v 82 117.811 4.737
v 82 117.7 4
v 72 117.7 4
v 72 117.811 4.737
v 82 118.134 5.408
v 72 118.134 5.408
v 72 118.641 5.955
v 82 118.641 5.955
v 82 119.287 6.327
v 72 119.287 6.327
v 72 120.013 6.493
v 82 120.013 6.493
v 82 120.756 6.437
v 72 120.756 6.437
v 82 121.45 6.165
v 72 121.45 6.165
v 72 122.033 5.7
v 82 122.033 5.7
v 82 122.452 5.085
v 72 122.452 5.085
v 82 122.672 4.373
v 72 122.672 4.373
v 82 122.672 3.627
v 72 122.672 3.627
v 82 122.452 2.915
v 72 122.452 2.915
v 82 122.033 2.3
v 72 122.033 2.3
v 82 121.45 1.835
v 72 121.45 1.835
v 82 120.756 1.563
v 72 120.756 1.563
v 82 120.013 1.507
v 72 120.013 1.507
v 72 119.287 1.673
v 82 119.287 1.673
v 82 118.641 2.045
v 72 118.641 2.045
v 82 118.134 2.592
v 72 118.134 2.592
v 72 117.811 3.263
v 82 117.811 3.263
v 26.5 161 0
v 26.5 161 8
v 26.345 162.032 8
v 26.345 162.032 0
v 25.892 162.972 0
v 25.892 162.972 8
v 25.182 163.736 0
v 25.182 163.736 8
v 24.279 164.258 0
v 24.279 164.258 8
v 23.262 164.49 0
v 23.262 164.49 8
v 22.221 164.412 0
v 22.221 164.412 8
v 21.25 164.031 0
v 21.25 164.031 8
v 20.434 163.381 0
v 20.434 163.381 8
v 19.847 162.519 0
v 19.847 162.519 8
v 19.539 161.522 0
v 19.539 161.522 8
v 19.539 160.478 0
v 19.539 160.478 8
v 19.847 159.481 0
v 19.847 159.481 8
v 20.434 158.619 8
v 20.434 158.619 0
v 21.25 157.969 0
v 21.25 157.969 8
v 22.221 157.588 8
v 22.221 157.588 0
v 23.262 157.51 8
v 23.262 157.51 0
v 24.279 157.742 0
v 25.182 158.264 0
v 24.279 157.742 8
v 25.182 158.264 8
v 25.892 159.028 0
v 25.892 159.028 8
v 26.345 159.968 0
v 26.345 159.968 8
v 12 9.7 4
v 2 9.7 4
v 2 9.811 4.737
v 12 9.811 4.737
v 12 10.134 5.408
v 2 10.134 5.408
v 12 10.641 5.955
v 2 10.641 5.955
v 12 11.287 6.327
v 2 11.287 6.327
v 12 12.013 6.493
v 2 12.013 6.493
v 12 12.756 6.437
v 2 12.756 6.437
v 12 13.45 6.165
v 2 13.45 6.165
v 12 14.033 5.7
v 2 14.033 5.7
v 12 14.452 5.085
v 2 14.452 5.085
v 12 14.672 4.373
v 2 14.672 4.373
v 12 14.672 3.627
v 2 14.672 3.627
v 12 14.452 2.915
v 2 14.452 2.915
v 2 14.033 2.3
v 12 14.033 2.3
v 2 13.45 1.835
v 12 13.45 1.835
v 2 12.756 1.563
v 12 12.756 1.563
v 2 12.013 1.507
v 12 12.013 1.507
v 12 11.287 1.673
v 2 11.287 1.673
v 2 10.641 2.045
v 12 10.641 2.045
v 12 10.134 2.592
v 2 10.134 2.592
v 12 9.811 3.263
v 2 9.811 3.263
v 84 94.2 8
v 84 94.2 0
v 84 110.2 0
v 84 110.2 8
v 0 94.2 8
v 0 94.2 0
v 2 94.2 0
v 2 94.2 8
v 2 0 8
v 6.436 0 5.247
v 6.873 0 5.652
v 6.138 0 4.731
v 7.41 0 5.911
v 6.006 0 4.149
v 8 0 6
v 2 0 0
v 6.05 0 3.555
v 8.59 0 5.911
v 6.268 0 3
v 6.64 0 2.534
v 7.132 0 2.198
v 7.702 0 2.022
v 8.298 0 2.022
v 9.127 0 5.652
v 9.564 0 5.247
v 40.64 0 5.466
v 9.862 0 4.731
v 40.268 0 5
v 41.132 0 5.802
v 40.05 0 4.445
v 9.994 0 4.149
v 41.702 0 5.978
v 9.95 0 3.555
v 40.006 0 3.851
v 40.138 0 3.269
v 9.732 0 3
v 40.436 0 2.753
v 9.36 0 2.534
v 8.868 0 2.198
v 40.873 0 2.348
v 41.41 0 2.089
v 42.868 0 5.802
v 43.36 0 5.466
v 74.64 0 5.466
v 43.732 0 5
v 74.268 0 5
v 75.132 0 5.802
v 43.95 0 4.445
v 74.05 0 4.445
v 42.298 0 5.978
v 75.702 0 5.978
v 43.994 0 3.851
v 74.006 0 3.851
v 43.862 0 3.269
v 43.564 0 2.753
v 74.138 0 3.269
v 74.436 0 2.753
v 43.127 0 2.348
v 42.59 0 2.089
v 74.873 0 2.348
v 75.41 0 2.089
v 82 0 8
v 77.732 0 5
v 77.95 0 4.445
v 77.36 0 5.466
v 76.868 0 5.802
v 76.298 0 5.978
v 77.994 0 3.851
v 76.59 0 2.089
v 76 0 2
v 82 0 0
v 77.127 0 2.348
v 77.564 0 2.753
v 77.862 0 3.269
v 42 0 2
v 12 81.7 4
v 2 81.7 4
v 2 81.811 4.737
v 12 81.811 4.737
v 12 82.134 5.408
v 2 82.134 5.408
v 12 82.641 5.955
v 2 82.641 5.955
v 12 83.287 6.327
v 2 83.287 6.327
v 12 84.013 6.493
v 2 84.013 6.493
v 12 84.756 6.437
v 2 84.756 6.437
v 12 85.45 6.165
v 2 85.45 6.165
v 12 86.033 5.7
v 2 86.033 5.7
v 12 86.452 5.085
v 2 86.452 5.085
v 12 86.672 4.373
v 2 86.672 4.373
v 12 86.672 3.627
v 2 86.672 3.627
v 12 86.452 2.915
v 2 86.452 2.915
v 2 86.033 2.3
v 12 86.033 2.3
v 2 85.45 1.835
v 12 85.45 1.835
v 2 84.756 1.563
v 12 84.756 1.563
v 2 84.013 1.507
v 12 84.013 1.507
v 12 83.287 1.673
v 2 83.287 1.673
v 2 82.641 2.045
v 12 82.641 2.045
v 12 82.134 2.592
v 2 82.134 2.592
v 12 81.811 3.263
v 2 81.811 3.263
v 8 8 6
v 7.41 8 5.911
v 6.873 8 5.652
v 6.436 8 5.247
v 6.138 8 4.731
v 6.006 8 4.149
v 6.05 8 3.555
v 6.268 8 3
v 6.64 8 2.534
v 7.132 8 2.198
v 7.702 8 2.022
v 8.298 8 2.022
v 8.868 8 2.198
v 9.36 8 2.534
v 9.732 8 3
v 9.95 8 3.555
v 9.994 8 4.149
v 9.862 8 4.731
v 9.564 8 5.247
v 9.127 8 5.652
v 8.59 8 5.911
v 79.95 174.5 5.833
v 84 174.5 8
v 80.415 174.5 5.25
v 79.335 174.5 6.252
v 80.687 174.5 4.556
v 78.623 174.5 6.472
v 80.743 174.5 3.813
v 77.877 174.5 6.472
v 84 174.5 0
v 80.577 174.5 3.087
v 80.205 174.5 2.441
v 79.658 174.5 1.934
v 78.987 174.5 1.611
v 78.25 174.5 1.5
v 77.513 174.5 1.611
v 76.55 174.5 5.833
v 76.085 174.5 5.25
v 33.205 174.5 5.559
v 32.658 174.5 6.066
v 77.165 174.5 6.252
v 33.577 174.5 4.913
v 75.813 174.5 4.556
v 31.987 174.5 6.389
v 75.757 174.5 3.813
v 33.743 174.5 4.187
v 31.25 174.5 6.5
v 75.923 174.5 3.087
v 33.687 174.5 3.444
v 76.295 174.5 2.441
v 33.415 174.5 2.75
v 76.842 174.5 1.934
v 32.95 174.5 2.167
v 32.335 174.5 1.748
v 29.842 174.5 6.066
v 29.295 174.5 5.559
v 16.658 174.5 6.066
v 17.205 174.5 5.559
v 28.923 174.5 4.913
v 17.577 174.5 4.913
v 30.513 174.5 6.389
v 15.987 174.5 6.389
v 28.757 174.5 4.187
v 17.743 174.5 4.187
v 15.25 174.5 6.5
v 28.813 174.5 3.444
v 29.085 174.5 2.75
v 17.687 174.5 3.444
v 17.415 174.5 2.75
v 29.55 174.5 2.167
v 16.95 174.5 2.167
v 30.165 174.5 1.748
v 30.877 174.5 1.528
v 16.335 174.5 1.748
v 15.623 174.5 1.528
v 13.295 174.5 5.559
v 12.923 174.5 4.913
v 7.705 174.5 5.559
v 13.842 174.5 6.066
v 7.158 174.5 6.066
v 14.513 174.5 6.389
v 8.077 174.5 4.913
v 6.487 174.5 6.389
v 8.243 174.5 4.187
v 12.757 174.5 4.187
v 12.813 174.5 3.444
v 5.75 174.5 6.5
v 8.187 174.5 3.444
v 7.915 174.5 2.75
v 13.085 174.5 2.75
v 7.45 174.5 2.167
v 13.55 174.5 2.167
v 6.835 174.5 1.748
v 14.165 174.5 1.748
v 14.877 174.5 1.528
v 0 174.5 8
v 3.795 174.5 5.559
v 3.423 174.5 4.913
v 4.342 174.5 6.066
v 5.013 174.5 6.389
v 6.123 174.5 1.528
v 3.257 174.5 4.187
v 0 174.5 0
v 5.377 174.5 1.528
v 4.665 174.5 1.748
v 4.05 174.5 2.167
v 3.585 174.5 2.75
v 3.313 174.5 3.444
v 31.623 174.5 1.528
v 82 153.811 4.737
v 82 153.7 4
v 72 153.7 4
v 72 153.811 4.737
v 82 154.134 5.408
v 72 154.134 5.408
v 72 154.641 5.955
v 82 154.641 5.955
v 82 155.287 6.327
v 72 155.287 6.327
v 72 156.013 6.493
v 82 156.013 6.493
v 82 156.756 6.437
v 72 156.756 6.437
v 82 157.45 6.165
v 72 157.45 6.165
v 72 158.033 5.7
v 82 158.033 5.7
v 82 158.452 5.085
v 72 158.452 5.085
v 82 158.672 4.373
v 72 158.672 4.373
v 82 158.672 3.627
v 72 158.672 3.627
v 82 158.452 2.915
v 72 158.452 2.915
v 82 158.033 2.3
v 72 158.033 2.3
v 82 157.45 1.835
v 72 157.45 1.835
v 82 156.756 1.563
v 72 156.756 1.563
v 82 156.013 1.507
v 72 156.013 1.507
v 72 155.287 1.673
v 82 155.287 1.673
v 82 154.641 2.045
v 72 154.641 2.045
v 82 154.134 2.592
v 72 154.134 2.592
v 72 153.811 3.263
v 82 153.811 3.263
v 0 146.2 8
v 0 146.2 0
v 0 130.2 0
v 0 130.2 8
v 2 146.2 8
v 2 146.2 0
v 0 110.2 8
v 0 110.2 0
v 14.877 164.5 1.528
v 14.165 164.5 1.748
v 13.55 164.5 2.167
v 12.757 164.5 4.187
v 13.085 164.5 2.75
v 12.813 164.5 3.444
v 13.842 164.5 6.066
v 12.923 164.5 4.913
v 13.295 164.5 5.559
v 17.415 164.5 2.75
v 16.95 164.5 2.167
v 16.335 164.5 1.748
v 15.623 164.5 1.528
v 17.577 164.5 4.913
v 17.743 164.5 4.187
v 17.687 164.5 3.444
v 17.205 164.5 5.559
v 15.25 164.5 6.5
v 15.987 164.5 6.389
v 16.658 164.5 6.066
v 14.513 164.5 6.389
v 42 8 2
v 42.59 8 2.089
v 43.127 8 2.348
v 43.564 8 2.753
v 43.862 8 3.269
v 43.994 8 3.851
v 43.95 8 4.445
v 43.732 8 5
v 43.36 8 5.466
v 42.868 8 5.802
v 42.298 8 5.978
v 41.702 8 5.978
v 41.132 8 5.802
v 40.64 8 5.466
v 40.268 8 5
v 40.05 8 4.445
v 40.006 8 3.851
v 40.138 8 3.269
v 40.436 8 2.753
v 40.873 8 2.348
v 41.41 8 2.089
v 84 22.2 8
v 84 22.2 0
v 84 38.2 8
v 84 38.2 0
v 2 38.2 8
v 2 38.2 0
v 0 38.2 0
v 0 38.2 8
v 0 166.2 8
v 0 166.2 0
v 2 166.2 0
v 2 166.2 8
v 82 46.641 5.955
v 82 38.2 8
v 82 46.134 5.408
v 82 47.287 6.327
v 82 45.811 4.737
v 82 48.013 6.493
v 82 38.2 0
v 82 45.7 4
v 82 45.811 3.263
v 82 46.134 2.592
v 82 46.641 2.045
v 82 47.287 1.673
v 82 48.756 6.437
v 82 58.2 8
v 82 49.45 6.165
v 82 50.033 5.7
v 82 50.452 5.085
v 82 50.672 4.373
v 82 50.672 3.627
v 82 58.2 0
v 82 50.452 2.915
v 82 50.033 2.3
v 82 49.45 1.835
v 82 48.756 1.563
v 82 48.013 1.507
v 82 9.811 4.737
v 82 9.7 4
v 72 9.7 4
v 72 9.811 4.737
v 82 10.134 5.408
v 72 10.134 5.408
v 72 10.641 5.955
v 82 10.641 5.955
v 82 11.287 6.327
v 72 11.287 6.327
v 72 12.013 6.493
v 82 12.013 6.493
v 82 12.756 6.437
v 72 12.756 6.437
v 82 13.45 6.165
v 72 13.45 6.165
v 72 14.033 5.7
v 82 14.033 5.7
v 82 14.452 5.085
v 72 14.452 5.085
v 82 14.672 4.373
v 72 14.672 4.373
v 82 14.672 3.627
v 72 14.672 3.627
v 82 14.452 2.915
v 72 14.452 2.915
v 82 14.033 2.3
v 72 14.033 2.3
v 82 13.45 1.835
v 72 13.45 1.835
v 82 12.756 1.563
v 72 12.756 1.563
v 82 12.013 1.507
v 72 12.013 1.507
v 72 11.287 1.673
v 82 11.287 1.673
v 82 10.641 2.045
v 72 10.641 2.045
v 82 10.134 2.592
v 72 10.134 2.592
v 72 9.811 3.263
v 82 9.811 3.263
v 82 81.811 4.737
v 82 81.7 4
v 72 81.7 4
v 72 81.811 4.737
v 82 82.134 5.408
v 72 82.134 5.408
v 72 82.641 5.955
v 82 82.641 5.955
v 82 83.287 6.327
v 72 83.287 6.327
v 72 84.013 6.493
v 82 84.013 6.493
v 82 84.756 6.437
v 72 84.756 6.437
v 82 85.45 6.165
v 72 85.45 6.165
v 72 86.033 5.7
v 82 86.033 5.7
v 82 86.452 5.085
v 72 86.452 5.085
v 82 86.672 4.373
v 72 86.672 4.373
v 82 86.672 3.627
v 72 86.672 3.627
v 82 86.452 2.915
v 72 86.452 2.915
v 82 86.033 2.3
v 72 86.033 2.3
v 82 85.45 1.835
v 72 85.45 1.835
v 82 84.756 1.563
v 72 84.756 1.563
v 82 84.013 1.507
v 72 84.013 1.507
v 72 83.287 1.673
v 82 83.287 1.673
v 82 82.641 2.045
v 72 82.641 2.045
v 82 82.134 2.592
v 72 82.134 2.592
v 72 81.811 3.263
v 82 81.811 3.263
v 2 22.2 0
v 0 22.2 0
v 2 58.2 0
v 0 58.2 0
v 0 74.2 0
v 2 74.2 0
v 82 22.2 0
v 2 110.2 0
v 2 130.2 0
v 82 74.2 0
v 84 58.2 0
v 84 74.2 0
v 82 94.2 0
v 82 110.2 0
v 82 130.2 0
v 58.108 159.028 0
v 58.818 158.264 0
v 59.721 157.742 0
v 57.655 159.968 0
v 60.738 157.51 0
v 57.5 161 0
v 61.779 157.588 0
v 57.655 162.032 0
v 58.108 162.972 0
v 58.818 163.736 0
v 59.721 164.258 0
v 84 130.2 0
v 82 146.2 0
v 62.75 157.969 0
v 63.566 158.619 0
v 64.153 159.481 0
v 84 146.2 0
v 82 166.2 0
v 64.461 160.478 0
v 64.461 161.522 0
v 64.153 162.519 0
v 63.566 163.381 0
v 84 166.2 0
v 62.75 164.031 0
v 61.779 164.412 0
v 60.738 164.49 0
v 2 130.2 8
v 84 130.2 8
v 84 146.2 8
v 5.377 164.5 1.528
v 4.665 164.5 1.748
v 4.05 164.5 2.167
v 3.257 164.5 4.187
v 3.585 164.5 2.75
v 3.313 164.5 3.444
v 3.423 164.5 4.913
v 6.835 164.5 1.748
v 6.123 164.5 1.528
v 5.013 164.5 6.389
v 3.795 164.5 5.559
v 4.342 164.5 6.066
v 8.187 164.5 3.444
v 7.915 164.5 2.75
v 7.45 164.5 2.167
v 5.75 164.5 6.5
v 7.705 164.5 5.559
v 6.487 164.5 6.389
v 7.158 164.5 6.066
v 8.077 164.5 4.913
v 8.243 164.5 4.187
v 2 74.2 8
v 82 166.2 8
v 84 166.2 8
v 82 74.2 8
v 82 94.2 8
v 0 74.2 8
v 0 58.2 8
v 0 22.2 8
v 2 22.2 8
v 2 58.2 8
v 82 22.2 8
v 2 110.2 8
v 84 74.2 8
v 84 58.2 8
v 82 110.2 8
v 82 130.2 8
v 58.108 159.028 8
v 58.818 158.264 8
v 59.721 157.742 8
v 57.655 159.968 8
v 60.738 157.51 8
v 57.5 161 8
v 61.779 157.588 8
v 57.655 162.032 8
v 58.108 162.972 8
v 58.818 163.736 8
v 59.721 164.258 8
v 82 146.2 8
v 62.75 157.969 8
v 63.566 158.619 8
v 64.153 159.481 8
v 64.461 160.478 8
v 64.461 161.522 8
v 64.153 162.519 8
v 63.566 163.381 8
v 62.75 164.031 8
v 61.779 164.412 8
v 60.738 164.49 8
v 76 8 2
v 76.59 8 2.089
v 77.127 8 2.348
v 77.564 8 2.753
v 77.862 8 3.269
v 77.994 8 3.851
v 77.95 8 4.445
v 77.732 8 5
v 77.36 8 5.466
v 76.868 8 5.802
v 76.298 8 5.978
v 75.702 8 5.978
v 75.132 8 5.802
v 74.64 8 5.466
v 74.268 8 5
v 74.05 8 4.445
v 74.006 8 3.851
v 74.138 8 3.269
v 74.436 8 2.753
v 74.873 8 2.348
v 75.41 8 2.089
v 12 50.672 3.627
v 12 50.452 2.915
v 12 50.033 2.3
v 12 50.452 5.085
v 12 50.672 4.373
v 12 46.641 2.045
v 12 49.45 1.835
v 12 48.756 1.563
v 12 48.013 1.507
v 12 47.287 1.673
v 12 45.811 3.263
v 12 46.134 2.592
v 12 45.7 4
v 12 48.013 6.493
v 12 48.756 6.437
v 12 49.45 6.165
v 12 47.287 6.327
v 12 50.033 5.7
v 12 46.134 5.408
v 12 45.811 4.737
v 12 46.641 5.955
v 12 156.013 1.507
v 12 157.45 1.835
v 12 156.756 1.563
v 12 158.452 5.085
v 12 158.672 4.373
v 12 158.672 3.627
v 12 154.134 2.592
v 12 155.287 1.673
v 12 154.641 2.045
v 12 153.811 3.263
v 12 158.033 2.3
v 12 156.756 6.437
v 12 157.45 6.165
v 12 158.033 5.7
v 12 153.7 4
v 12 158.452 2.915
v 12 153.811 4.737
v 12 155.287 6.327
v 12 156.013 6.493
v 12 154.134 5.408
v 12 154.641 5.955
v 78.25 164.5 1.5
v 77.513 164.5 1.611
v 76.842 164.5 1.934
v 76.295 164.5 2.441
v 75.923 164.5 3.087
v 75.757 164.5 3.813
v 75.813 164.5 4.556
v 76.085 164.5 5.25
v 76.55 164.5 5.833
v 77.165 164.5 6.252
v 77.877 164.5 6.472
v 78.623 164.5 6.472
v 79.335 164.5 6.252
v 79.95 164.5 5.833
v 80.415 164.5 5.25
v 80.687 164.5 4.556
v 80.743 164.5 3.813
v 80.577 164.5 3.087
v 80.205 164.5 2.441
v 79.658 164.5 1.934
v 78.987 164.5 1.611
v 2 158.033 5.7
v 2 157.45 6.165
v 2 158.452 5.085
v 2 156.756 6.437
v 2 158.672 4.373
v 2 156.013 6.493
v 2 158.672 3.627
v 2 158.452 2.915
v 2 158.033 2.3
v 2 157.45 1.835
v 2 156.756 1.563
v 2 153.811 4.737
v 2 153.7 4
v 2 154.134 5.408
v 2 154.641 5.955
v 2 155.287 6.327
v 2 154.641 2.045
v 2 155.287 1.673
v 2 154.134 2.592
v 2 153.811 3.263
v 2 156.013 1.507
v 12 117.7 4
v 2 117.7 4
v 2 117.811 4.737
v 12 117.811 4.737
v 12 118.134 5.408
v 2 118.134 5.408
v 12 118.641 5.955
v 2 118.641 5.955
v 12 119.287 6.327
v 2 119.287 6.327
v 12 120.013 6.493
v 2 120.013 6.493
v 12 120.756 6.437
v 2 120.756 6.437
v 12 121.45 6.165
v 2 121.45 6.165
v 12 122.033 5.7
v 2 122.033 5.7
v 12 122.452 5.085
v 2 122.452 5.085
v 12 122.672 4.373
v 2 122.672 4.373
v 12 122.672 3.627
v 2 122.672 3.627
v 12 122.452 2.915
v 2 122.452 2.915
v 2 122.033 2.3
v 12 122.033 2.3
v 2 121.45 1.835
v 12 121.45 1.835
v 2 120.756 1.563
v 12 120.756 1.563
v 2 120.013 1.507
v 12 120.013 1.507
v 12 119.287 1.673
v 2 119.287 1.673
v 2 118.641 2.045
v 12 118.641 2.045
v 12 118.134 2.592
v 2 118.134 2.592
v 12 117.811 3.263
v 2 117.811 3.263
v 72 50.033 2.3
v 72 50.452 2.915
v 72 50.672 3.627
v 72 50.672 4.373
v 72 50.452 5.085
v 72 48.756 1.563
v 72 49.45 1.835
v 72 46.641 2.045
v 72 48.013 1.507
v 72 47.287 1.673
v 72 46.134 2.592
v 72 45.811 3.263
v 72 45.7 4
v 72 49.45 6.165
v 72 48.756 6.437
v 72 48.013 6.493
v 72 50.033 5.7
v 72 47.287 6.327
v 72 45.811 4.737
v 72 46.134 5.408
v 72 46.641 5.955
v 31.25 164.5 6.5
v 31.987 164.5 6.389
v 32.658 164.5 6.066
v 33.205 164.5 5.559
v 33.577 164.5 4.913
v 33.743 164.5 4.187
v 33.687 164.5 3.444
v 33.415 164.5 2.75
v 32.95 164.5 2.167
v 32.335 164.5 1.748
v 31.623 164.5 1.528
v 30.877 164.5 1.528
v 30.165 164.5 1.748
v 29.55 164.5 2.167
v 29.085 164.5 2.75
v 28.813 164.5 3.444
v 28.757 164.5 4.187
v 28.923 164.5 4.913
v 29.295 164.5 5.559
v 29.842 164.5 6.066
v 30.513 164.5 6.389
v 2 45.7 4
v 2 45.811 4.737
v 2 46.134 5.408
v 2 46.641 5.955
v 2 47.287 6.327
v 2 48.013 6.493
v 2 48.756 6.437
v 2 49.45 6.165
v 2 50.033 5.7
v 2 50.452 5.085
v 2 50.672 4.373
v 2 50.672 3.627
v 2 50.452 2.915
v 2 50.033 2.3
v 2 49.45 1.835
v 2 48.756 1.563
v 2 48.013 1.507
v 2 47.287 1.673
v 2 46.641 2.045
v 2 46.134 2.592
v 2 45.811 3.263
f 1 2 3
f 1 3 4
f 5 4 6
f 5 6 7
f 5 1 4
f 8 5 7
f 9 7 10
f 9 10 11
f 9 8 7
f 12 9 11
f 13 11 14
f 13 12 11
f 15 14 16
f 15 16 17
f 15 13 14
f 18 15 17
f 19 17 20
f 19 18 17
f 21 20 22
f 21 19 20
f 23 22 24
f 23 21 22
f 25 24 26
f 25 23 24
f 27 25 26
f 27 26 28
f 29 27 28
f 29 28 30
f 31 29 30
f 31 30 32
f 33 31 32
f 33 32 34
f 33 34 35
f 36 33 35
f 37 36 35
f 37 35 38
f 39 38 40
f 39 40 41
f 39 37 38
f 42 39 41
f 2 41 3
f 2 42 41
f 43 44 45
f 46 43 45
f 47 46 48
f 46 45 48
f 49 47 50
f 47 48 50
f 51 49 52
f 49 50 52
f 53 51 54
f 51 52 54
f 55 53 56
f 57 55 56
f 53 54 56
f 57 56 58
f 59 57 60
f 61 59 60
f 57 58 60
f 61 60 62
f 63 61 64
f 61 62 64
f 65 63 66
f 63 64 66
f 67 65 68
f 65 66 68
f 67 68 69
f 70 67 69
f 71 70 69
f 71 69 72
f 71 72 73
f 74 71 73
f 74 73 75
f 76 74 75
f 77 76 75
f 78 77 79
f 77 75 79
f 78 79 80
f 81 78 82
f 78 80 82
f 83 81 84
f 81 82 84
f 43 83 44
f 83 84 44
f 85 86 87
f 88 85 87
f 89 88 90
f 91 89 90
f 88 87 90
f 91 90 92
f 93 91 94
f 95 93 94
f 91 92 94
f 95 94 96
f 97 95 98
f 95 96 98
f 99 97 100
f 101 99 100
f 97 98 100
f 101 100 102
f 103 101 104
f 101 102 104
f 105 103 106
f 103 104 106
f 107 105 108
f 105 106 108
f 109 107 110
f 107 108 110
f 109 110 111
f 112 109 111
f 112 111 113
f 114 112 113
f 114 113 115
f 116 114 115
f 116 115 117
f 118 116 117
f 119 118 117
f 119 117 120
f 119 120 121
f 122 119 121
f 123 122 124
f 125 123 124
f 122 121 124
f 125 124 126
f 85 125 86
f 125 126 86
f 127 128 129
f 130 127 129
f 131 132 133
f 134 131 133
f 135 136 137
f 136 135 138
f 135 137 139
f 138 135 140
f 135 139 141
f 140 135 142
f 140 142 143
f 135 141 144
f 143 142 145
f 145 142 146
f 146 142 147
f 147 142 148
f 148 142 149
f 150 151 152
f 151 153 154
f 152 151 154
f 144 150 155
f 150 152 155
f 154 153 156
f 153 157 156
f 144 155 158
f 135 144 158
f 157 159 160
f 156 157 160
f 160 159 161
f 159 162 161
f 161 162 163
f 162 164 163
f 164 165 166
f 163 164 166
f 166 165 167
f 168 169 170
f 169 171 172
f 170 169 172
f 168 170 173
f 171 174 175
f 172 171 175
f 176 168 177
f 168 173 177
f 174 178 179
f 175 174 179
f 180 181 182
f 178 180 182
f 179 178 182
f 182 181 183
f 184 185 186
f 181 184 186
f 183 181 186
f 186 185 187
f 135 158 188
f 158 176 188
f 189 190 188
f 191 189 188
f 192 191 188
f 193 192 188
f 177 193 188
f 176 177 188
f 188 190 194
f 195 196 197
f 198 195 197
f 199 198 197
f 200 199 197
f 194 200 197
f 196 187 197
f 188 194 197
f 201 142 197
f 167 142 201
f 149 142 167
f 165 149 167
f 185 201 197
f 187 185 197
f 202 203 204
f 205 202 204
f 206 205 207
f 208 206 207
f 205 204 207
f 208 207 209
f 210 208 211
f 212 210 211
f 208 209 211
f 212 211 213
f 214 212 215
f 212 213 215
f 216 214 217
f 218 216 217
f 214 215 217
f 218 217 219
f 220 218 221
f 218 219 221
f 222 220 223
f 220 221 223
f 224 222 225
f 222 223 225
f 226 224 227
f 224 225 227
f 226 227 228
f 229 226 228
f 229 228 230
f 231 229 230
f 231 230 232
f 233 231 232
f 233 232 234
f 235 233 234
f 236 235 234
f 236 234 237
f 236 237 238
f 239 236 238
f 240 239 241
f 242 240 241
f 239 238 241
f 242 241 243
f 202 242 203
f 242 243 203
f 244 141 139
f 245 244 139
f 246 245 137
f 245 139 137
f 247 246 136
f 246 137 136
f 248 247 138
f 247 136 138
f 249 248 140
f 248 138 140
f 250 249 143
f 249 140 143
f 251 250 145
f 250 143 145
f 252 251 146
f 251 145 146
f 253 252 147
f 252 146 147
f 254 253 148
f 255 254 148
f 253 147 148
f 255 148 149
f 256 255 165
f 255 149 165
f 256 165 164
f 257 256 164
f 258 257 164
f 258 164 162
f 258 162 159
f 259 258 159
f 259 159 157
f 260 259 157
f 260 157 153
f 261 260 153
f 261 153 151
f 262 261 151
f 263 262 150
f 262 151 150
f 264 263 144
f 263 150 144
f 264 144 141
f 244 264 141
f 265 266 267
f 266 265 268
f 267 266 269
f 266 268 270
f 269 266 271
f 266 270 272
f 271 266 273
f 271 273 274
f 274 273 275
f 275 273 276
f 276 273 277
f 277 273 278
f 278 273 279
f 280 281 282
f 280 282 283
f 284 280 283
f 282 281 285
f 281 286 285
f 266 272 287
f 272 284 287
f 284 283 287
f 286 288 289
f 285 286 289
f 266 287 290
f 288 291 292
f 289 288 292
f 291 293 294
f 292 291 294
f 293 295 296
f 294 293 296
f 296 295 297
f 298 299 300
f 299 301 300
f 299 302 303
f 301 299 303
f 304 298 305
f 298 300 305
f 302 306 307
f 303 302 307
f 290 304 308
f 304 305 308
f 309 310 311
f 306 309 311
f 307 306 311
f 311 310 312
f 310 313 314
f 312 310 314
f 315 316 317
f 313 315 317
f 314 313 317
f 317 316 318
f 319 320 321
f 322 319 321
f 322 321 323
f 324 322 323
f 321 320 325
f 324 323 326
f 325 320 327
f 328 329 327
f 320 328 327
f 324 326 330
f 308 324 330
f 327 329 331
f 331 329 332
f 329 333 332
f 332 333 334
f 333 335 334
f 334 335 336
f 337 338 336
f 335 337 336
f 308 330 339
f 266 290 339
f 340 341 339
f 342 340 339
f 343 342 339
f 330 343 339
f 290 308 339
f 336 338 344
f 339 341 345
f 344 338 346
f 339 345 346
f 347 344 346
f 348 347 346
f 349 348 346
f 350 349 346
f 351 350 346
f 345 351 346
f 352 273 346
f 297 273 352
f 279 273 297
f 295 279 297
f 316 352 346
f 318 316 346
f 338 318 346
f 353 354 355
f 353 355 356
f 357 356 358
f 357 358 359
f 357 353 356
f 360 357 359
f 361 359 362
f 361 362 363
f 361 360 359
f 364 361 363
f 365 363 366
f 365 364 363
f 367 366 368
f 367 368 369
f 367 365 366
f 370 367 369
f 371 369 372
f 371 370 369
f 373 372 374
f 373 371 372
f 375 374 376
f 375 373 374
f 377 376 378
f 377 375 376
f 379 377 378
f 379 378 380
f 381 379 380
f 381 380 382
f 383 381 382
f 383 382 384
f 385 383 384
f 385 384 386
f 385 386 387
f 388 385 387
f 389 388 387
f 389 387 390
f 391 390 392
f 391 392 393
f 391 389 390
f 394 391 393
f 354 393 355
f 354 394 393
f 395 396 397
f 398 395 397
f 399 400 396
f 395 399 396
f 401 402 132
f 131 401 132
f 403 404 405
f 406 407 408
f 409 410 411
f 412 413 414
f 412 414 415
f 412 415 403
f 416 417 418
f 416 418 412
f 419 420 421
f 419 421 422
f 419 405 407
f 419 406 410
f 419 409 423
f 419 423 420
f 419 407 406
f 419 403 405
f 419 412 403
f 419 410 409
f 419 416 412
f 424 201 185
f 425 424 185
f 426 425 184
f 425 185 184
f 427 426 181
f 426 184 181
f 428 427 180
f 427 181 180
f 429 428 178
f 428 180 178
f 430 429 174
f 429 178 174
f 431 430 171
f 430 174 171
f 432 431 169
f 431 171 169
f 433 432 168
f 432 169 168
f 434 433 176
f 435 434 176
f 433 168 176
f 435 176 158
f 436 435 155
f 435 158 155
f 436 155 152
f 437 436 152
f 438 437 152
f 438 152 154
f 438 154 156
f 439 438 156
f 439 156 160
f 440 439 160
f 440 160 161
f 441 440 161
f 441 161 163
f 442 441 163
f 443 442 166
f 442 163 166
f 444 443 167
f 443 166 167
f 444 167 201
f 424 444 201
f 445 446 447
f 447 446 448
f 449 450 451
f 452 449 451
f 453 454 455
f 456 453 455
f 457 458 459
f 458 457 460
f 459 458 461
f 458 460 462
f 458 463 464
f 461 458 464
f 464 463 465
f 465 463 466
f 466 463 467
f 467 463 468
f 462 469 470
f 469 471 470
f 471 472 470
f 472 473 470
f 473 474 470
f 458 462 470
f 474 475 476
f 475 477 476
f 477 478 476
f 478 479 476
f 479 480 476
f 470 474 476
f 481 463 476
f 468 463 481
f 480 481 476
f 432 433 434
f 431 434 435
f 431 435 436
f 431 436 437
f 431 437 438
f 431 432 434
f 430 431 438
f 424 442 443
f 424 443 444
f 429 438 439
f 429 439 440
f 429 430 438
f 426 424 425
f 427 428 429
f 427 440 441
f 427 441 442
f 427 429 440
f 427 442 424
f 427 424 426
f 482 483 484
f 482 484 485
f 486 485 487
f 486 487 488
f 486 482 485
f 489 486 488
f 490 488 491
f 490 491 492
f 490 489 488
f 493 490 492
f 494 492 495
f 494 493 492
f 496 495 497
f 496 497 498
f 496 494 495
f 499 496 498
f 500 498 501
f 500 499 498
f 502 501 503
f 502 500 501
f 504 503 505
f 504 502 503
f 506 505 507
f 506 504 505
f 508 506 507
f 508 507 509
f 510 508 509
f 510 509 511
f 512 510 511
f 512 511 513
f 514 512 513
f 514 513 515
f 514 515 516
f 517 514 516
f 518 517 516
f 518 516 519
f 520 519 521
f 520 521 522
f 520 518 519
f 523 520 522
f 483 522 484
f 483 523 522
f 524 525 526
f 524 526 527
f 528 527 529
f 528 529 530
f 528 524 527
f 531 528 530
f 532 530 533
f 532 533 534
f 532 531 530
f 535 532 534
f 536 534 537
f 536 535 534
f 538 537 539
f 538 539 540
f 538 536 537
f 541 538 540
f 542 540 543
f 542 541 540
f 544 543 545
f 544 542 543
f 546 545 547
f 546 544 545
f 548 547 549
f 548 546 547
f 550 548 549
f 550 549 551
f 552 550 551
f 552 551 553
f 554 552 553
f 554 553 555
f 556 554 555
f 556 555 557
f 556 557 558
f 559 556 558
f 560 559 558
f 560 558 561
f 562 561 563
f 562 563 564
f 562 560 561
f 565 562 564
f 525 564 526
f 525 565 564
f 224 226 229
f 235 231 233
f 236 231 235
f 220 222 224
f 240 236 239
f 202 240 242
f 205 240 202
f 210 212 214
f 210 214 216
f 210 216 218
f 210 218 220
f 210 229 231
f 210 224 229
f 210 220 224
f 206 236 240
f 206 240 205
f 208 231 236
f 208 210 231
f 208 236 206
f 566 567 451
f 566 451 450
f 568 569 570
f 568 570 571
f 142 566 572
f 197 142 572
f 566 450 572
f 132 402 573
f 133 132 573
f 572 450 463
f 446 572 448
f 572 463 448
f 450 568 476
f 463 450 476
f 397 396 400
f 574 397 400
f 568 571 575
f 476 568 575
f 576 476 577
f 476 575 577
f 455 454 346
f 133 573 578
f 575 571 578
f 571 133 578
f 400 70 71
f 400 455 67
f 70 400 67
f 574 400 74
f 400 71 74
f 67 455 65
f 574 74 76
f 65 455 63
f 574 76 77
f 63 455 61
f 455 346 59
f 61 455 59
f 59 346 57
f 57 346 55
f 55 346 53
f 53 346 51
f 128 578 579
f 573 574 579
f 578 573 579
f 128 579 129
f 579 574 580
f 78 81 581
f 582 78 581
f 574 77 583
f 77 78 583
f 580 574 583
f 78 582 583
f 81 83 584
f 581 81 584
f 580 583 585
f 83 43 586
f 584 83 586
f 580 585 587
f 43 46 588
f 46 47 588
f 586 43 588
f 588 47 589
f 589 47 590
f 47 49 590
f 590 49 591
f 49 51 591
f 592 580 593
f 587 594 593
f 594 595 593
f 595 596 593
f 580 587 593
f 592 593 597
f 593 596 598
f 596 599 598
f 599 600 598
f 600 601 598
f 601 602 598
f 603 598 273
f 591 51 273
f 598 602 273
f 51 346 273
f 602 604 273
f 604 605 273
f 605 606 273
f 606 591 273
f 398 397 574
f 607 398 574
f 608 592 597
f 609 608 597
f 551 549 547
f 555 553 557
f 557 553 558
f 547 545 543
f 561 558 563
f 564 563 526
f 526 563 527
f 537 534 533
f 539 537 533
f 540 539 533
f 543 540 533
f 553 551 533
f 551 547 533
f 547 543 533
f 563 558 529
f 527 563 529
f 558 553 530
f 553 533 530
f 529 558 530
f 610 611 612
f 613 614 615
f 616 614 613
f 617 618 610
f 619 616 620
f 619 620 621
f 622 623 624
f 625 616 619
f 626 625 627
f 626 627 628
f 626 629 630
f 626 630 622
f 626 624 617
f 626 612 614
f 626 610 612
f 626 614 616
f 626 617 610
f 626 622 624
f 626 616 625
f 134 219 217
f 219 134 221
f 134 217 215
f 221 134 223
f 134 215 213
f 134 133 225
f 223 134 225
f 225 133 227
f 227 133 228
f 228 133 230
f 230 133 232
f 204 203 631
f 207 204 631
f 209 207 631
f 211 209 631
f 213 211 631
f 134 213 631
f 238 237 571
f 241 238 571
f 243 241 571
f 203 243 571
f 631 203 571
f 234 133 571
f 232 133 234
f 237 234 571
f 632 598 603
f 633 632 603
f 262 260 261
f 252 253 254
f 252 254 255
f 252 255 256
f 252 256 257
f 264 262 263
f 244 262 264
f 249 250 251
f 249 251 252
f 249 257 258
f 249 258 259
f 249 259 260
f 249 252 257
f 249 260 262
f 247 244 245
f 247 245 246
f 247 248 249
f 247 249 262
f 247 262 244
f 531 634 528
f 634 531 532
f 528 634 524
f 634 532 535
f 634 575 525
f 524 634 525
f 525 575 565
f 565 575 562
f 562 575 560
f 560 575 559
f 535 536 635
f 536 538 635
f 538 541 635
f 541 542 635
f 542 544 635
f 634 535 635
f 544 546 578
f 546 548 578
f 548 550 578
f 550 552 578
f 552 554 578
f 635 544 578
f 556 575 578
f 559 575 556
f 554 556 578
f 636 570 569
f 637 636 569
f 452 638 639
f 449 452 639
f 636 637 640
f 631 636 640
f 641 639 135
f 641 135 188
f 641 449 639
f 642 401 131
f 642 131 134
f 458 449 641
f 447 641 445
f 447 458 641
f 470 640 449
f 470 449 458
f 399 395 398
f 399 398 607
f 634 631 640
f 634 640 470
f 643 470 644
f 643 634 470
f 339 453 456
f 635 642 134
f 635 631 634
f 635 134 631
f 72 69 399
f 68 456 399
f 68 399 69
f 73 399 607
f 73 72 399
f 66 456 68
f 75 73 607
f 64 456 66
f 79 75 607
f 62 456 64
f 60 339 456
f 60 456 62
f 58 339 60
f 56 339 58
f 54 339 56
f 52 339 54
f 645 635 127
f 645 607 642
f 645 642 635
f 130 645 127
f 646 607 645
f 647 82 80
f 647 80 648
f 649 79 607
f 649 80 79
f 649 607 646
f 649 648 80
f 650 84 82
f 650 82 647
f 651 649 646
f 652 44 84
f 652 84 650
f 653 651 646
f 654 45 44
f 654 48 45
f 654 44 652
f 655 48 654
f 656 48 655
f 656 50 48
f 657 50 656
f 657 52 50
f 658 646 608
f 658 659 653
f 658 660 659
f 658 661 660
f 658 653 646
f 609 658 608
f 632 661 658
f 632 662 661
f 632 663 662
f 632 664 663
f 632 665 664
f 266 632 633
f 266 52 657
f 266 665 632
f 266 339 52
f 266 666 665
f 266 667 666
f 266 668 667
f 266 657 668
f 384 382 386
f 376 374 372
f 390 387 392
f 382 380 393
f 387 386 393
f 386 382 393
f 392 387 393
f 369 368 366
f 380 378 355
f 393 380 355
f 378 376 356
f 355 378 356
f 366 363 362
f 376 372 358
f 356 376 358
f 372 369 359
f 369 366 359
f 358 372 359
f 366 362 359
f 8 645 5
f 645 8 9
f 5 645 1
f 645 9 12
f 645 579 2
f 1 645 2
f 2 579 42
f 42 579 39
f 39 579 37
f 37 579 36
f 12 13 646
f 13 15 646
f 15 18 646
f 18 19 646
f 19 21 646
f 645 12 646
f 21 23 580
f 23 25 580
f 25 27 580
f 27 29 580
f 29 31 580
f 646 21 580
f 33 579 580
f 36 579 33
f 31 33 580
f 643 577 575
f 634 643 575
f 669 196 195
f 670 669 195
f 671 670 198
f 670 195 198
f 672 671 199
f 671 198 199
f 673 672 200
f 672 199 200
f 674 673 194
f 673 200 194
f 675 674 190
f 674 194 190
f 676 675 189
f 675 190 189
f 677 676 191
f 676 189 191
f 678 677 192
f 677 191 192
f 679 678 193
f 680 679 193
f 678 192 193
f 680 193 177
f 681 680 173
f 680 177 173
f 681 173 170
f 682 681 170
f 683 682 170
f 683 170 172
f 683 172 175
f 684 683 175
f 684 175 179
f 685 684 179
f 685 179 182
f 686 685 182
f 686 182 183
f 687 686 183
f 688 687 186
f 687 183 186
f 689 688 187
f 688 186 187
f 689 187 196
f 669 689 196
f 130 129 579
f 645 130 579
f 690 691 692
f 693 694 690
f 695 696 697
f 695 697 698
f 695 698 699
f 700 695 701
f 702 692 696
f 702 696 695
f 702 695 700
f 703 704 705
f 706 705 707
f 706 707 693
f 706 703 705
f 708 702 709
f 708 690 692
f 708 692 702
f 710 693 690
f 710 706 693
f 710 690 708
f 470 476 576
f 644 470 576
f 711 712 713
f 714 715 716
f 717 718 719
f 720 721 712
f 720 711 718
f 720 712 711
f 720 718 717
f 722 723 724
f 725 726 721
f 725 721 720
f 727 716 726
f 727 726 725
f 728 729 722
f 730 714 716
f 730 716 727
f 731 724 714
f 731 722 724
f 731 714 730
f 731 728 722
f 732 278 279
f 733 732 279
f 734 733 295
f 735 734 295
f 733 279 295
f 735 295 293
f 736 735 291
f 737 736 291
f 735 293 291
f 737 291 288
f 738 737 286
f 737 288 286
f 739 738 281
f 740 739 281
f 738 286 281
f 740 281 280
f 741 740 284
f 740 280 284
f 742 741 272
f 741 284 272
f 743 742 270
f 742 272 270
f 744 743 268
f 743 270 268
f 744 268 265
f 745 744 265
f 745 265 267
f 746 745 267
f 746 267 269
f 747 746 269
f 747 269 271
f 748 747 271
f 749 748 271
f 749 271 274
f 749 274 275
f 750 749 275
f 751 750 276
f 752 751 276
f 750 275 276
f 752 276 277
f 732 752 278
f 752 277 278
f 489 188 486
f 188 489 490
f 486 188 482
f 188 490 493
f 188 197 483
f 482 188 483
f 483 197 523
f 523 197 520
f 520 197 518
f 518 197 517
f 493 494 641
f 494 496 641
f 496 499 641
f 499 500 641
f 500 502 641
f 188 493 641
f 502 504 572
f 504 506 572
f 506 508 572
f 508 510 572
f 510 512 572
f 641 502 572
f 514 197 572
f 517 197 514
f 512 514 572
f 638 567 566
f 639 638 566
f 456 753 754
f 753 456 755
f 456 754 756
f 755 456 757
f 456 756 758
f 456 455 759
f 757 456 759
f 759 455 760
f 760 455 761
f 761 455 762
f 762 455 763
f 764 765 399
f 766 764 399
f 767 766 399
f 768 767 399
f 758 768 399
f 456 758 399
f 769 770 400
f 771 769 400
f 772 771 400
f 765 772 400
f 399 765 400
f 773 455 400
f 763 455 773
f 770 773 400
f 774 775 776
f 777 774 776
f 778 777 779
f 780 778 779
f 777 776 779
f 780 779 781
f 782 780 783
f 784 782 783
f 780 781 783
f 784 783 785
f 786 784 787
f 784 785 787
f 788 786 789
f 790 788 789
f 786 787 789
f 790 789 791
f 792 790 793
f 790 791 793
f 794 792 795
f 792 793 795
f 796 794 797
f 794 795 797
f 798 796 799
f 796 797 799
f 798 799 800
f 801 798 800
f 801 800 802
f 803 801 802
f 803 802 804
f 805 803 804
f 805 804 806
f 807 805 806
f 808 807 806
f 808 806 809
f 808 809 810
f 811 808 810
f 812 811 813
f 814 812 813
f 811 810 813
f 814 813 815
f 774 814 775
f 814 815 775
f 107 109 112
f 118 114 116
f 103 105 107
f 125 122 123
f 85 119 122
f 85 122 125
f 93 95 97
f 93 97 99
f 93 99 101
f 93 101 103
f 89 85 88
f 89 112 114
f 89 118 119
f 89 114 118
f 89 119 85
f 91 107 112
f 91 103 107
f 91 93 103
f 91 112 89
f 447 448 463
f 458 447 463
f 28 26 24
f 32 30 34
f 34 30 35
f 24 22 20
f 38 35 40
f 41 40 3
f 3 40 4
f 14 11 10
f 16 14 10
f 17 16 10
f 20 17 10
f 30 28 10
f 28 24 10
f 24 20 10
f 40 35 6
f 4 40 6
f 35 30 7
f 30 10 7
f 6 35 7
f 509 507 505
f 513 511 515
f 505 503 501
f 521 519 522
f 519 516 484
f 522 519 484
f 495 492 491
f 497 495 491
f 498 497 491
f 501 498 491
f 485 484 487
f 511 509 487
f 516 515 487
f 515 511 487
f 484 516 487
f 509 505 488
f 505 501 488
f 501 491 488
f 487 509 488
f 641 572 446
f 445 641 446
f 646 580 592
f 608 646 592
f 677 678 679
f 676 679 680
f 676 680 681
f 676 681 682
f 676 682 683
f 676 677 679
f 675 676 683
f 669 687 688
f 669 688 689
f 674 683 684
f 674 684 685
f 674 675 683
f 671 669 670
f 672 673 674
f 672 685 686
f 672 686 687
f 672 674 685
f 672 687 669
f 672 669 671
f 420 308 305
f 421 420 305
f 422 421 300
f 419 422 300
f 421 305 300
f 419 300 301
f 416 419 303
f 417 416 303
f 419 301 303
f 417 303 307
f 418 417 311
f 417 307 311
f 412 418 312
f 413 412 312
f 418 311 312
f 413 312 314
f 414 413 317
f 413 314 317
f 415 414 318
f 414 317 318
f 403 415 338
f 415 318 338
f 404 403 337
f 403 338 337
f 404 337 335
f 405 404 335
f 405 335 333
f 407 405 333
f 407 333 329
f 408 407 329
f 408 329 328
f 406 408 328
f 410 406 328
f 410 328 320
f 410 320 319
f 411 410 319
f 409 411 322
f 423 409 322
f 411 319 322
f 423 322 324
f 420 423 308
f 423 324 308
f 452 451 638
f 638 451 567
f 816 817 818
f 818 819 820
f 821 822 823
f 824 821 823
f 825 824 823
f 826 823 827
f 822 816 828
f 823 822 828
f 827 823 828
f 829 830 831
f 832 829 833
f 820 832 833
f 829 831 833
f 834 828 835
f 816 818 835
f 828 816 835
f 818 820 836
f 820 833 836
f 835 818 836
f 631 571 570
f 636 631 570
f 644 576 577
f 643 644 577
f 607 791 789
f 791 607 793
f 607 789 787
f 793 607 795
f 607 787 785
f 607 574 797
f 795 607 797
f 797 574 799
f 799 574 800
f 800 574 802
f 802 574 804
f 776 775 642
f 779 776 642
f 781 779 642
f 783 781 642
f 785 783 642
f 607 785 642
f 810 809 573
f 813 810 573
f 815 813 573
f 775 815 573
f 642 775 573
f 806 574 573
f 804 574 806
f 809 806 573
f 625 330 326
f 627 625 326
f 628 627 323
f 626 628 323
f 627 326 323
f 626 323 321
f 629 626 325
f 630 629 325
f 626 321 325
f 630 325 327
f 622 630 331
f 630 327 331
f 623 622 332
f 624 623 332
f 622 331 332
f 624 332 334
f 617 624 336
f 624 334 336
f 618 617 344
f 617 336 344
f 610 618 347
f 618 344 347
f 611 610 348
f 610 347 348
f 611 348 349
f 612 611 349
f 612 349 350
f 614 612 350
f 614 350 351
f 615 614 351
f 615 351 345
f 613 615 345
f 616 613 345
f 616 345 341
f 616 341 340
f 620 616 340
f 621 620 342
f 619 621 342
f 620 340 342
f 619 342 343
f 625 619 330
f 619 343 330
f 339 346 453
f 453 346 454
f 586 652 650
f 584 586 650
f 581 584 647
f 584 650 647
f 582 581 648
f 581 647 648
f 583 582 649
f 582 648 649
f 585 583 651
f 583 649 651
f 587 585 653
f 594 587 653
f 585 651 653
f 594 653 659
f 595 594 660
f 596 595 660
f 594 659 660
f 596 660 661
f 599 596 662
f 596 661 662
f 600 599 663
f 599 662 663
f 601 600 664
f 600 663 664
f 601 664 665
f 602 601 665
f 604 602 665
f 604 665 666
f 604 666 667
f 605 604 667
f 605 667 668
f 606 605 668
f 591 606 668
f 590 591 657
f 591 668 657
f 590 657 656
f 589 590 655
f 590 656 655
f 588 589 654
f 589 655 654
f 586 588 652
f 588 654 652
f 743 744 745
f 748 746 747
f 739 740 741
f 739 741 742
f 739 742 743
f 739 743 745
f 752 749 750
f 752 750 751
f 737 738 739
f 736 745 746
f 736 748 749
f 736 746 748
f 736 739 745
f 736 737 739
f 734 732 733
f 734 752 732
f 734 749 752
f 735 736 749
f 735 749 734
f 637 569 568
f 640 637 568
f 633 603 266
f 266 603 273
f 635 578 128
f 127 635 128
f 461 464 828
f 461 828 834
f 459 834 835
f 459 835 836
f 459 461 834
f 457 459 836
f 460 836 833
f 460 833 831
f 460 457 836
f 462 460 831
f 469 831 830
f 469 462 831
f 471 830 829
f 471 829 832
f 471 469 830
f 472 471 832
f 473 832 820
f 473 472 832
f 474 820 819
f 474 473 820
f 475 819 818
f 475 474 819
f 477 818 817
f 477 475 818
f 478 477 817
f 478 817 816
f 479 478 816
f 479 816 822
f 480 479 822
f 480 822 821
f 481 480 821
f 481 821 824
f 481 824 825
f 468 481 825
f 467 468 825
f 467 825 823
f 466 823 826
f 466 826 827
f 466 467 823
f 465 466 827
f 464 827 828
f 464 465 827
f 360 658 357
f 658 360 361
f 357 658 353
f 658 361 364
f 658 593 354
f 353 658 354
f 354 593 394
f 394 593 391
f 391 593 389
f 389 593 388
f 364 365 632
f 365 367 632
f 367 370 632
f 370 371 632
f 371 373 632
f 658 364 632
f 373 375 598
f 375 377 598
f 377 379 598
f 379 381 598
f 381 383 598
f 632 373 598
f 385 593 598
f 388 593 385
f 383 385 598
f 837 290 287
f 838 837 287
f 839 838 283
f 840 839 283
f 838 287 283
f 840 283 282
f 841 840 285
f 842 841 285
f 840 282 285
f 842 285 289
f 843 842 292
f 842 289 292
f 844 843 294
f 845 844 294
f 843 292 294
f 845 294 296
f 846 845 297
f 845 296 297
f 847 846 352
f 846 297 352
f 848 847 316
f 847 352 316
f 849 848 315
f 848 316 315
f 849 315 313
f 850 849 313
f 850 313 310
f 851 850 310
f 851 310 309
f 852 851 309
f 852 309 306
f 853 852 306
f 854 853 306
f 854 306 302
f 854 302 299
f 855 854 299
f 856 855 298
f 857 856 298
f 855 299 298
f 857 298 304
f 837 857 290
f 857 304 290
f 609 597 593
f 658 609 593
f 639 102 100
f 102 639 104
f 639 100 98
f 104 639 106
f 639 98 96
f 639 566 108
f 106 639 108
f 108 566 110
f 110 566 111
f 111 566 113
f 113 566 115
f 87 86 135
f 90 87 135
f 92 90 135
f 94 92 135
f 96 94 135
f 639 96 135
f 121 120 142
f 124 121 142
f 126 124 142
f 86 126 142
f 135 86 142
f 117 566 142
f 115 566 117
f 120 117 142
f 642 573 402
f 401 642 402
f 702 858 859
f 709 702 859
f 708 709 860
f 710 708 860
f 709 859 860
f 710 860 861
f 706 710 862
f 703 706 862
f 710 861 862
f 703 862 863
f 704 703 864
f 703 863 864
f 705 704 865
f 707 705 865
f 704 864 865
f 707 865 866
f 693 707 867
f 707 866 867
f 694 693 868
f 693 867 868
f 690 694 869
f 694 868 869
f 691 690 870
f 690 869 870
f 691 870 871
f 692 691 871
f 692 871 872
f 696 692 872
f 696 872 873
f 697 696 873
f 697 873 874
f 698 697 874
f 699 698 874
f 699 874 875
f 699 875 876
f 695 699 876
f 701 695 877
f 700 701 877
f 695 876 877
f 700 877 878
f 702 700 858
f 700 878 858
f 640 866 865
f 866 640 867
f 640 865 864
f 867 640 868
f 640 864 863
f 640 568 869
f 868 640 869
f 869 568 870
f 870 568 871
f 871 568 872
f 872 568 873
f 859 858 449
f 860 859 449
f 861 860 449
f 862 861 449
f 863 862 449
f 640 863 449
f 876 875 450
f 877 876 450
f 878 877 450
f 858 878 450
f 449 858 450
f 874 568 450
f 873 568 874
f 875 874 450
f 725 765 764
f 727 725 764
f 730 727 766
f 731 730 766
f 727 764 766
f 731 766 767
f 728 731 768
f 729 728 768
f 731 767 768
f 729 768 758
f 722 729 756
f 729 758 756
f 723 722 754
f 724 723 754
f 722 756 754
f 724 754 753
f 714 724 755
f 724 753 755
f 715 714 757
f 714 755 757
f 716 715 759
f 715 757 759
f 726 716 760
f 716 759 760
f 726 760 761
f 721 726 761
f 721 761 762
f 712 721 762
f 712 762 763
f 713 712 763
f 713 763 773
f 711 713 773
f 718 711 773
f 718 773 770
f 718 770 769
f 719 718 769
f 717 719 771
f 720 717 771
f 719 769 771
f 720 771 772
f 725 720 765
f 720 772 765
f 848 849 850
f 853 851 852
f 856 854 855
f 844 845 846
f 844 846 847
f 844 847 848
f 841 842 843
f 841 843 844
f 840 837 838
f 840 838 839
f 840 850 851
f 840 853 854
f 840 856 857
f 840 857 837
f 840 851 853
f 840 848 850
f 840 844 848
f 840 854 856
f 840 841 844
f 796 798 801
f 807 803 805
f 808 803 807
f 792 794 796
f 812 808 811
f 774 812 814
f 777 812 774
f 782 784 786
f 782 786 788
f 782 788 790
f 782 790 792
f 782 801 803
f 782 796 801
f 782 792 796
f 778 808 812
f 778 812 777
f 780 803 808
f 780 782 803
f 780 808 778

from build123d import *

# Parameters (mm, degrees)
BOSS_EXTRUDE1_DEPTH = 8
SKETCH2_R           = 2.5
CUT_EXTRUDE1_DEPTH  = 10
SKETCH3_R           = 2
CUT_EXTRUDE2_DEPTH  = 8
SKETCH4_R           = 2.5
CUT_EXTRUDE3_DEPTH  = 10
SKETCH5_R           = 2.5
CUT_EXTRUDE4_DEPTH  = 10
SKETCH6_R           = 3.5
CUT_EXTRUDE5_DEPTH  = 8


with BuildPart() as part:
    # Sketch1 → Boss-Extrude1 (new body)
    with BuildSketch(Plane.XY):
        Polygon((0, 38.2), (0, 22.2), (2, 22.2), (2, 0), (42, 0), (42, 174.5), (0, 174.5), (0, 166.2), (2, 166.2), (2, 146.2), (0, 146.2), (0, 130.2), (2, 130.2), (2, 110.2), (0, 110.2), (0, 94.2), (2, 94.2), (2, 74.2), (0, 74.2), (0, 58.2), (2, 58.2), (2, 38.2), align=None)
        Polygon((42, 174.5), (42, 0), (82, 0), (82, 22.2), (84, 22.2), (84, 38.2), (82, 38.2), (82, 58.2), (84, 58.2), (84, 74.2), (82, 74.2), (82, 94.2), (84, 94.2), (84, 110.2), (82, 110.2), (82, 130.2), (84, 130.2), (84, 146.2), (82, 146.2), (82, 166.2), (84, 166.2), (84, 174.5), align=None)
    extrude(amount=BOSS_EXTRUDE1_DEPTH)

    # Sketch2 → Cut-Extrude1 (cut)
    with BuildSketch(Plane.ZY.offset(-2)):
        with Locations(Location((4, 156.2, 0), (0, 0, 270))):
            Circle(SKETCH2_R)
        with Locations(Location((4, 120.2, 0), (0, 0, 270))):
            Circle(SKETCH2_R)
        with Locations(Location((4, 84.2, 0), (0, 0, 270))):
            Circle(SKETCH2_R)
        with Locations(Location((4, 48.2, 0), (0, 0, 270))):
            Circle(SKETCH2_R)
        with Locations(Location((4, 12.2, 0), (0, 0, 270))):
            Circle(SKETCH2_R)
    cut_extrude1 = extrude(amount=-CUT_EXTRUDE1_DEPTH, mode=Mode.SUBTRACT)

    # Mirror1: Cut-Extrude1 across plane
    add(cut_extrude1.mirror(Plane(origin=(42, 0, 0), x_dir=(0, 0, 1), z_dir=(1, 0, 0))), mode=Mode.SUBTRACT)

    # Sketch3 → Cut-Extrude2 (cut)
    with BuildSketch(Plane.XZ):
        with Locations(Location((42, 4, 0), (0, 0, 270))):
            Circle(SKETCH3_R)
        with Locations(Location((76, 4, 0), (0, 0, 270))):
            Circle(SKETCH3_R)
        with Locations(Location((8, 4, 0), (0, 0, 90))):
            Circle(SKETCH3_R)
    extrude(amount=-CUT_EXTRUDE2_DEPTH, mode=Mode.SUBTRACT)

    # Sketch4 → Cut-Extrude3 (cut)
    with BuildSketch(Plane(origin=(0, 174.5, 0), x_dir=(1, 0, 0), z_dir=(0, 1, 0))):
        with Locations(Location((5.75, -4, 0), (0, 0, 270))):
            Circle(SKETCH4_R)
        with Locations(Location((78.25, -4, 0), (0, 0, 90))):
            Circle(SKETCH4_R)
    extrude(amount=-CUT_EXTRUDE3_DEPTH, mode=Mode.SUBTRACT)

    # Sketch5 → Cut-Extrude4 (cut)
    with BuildSketch(Plane(origin=(0, 174.5, 0), x_dir=(1, 0, 0), z_dir=(0, 1, 0))):
        with Locations(Location((15.25, -4, 0), (0, 0, 270))):
            Circle(SKETCH5_R)
        with Locations(Location((31.25, -4, 0), (0, 0, 270))):
            Circle(SKETCH5_R)
    extrude(amount=-CUT_EXTRUDE4_DEPTH, mode=Mode.SUBTRACT)

    # Sketch6 → Cut-Extrude5 (cut)
    with BuildSketch(Plane.XY.offset(8)):
        with Locations((23, 161)):
            Circle(SKETCH6_R)
        with Locations(Location((61, 161, 0), (0, 0, 180))):
            Circle(SKETCH6_R)
    extrude(amount=-CUT_EXTRUDE5_DEPTH, mode=Mode.SUBTRACT)


solid = part.part
